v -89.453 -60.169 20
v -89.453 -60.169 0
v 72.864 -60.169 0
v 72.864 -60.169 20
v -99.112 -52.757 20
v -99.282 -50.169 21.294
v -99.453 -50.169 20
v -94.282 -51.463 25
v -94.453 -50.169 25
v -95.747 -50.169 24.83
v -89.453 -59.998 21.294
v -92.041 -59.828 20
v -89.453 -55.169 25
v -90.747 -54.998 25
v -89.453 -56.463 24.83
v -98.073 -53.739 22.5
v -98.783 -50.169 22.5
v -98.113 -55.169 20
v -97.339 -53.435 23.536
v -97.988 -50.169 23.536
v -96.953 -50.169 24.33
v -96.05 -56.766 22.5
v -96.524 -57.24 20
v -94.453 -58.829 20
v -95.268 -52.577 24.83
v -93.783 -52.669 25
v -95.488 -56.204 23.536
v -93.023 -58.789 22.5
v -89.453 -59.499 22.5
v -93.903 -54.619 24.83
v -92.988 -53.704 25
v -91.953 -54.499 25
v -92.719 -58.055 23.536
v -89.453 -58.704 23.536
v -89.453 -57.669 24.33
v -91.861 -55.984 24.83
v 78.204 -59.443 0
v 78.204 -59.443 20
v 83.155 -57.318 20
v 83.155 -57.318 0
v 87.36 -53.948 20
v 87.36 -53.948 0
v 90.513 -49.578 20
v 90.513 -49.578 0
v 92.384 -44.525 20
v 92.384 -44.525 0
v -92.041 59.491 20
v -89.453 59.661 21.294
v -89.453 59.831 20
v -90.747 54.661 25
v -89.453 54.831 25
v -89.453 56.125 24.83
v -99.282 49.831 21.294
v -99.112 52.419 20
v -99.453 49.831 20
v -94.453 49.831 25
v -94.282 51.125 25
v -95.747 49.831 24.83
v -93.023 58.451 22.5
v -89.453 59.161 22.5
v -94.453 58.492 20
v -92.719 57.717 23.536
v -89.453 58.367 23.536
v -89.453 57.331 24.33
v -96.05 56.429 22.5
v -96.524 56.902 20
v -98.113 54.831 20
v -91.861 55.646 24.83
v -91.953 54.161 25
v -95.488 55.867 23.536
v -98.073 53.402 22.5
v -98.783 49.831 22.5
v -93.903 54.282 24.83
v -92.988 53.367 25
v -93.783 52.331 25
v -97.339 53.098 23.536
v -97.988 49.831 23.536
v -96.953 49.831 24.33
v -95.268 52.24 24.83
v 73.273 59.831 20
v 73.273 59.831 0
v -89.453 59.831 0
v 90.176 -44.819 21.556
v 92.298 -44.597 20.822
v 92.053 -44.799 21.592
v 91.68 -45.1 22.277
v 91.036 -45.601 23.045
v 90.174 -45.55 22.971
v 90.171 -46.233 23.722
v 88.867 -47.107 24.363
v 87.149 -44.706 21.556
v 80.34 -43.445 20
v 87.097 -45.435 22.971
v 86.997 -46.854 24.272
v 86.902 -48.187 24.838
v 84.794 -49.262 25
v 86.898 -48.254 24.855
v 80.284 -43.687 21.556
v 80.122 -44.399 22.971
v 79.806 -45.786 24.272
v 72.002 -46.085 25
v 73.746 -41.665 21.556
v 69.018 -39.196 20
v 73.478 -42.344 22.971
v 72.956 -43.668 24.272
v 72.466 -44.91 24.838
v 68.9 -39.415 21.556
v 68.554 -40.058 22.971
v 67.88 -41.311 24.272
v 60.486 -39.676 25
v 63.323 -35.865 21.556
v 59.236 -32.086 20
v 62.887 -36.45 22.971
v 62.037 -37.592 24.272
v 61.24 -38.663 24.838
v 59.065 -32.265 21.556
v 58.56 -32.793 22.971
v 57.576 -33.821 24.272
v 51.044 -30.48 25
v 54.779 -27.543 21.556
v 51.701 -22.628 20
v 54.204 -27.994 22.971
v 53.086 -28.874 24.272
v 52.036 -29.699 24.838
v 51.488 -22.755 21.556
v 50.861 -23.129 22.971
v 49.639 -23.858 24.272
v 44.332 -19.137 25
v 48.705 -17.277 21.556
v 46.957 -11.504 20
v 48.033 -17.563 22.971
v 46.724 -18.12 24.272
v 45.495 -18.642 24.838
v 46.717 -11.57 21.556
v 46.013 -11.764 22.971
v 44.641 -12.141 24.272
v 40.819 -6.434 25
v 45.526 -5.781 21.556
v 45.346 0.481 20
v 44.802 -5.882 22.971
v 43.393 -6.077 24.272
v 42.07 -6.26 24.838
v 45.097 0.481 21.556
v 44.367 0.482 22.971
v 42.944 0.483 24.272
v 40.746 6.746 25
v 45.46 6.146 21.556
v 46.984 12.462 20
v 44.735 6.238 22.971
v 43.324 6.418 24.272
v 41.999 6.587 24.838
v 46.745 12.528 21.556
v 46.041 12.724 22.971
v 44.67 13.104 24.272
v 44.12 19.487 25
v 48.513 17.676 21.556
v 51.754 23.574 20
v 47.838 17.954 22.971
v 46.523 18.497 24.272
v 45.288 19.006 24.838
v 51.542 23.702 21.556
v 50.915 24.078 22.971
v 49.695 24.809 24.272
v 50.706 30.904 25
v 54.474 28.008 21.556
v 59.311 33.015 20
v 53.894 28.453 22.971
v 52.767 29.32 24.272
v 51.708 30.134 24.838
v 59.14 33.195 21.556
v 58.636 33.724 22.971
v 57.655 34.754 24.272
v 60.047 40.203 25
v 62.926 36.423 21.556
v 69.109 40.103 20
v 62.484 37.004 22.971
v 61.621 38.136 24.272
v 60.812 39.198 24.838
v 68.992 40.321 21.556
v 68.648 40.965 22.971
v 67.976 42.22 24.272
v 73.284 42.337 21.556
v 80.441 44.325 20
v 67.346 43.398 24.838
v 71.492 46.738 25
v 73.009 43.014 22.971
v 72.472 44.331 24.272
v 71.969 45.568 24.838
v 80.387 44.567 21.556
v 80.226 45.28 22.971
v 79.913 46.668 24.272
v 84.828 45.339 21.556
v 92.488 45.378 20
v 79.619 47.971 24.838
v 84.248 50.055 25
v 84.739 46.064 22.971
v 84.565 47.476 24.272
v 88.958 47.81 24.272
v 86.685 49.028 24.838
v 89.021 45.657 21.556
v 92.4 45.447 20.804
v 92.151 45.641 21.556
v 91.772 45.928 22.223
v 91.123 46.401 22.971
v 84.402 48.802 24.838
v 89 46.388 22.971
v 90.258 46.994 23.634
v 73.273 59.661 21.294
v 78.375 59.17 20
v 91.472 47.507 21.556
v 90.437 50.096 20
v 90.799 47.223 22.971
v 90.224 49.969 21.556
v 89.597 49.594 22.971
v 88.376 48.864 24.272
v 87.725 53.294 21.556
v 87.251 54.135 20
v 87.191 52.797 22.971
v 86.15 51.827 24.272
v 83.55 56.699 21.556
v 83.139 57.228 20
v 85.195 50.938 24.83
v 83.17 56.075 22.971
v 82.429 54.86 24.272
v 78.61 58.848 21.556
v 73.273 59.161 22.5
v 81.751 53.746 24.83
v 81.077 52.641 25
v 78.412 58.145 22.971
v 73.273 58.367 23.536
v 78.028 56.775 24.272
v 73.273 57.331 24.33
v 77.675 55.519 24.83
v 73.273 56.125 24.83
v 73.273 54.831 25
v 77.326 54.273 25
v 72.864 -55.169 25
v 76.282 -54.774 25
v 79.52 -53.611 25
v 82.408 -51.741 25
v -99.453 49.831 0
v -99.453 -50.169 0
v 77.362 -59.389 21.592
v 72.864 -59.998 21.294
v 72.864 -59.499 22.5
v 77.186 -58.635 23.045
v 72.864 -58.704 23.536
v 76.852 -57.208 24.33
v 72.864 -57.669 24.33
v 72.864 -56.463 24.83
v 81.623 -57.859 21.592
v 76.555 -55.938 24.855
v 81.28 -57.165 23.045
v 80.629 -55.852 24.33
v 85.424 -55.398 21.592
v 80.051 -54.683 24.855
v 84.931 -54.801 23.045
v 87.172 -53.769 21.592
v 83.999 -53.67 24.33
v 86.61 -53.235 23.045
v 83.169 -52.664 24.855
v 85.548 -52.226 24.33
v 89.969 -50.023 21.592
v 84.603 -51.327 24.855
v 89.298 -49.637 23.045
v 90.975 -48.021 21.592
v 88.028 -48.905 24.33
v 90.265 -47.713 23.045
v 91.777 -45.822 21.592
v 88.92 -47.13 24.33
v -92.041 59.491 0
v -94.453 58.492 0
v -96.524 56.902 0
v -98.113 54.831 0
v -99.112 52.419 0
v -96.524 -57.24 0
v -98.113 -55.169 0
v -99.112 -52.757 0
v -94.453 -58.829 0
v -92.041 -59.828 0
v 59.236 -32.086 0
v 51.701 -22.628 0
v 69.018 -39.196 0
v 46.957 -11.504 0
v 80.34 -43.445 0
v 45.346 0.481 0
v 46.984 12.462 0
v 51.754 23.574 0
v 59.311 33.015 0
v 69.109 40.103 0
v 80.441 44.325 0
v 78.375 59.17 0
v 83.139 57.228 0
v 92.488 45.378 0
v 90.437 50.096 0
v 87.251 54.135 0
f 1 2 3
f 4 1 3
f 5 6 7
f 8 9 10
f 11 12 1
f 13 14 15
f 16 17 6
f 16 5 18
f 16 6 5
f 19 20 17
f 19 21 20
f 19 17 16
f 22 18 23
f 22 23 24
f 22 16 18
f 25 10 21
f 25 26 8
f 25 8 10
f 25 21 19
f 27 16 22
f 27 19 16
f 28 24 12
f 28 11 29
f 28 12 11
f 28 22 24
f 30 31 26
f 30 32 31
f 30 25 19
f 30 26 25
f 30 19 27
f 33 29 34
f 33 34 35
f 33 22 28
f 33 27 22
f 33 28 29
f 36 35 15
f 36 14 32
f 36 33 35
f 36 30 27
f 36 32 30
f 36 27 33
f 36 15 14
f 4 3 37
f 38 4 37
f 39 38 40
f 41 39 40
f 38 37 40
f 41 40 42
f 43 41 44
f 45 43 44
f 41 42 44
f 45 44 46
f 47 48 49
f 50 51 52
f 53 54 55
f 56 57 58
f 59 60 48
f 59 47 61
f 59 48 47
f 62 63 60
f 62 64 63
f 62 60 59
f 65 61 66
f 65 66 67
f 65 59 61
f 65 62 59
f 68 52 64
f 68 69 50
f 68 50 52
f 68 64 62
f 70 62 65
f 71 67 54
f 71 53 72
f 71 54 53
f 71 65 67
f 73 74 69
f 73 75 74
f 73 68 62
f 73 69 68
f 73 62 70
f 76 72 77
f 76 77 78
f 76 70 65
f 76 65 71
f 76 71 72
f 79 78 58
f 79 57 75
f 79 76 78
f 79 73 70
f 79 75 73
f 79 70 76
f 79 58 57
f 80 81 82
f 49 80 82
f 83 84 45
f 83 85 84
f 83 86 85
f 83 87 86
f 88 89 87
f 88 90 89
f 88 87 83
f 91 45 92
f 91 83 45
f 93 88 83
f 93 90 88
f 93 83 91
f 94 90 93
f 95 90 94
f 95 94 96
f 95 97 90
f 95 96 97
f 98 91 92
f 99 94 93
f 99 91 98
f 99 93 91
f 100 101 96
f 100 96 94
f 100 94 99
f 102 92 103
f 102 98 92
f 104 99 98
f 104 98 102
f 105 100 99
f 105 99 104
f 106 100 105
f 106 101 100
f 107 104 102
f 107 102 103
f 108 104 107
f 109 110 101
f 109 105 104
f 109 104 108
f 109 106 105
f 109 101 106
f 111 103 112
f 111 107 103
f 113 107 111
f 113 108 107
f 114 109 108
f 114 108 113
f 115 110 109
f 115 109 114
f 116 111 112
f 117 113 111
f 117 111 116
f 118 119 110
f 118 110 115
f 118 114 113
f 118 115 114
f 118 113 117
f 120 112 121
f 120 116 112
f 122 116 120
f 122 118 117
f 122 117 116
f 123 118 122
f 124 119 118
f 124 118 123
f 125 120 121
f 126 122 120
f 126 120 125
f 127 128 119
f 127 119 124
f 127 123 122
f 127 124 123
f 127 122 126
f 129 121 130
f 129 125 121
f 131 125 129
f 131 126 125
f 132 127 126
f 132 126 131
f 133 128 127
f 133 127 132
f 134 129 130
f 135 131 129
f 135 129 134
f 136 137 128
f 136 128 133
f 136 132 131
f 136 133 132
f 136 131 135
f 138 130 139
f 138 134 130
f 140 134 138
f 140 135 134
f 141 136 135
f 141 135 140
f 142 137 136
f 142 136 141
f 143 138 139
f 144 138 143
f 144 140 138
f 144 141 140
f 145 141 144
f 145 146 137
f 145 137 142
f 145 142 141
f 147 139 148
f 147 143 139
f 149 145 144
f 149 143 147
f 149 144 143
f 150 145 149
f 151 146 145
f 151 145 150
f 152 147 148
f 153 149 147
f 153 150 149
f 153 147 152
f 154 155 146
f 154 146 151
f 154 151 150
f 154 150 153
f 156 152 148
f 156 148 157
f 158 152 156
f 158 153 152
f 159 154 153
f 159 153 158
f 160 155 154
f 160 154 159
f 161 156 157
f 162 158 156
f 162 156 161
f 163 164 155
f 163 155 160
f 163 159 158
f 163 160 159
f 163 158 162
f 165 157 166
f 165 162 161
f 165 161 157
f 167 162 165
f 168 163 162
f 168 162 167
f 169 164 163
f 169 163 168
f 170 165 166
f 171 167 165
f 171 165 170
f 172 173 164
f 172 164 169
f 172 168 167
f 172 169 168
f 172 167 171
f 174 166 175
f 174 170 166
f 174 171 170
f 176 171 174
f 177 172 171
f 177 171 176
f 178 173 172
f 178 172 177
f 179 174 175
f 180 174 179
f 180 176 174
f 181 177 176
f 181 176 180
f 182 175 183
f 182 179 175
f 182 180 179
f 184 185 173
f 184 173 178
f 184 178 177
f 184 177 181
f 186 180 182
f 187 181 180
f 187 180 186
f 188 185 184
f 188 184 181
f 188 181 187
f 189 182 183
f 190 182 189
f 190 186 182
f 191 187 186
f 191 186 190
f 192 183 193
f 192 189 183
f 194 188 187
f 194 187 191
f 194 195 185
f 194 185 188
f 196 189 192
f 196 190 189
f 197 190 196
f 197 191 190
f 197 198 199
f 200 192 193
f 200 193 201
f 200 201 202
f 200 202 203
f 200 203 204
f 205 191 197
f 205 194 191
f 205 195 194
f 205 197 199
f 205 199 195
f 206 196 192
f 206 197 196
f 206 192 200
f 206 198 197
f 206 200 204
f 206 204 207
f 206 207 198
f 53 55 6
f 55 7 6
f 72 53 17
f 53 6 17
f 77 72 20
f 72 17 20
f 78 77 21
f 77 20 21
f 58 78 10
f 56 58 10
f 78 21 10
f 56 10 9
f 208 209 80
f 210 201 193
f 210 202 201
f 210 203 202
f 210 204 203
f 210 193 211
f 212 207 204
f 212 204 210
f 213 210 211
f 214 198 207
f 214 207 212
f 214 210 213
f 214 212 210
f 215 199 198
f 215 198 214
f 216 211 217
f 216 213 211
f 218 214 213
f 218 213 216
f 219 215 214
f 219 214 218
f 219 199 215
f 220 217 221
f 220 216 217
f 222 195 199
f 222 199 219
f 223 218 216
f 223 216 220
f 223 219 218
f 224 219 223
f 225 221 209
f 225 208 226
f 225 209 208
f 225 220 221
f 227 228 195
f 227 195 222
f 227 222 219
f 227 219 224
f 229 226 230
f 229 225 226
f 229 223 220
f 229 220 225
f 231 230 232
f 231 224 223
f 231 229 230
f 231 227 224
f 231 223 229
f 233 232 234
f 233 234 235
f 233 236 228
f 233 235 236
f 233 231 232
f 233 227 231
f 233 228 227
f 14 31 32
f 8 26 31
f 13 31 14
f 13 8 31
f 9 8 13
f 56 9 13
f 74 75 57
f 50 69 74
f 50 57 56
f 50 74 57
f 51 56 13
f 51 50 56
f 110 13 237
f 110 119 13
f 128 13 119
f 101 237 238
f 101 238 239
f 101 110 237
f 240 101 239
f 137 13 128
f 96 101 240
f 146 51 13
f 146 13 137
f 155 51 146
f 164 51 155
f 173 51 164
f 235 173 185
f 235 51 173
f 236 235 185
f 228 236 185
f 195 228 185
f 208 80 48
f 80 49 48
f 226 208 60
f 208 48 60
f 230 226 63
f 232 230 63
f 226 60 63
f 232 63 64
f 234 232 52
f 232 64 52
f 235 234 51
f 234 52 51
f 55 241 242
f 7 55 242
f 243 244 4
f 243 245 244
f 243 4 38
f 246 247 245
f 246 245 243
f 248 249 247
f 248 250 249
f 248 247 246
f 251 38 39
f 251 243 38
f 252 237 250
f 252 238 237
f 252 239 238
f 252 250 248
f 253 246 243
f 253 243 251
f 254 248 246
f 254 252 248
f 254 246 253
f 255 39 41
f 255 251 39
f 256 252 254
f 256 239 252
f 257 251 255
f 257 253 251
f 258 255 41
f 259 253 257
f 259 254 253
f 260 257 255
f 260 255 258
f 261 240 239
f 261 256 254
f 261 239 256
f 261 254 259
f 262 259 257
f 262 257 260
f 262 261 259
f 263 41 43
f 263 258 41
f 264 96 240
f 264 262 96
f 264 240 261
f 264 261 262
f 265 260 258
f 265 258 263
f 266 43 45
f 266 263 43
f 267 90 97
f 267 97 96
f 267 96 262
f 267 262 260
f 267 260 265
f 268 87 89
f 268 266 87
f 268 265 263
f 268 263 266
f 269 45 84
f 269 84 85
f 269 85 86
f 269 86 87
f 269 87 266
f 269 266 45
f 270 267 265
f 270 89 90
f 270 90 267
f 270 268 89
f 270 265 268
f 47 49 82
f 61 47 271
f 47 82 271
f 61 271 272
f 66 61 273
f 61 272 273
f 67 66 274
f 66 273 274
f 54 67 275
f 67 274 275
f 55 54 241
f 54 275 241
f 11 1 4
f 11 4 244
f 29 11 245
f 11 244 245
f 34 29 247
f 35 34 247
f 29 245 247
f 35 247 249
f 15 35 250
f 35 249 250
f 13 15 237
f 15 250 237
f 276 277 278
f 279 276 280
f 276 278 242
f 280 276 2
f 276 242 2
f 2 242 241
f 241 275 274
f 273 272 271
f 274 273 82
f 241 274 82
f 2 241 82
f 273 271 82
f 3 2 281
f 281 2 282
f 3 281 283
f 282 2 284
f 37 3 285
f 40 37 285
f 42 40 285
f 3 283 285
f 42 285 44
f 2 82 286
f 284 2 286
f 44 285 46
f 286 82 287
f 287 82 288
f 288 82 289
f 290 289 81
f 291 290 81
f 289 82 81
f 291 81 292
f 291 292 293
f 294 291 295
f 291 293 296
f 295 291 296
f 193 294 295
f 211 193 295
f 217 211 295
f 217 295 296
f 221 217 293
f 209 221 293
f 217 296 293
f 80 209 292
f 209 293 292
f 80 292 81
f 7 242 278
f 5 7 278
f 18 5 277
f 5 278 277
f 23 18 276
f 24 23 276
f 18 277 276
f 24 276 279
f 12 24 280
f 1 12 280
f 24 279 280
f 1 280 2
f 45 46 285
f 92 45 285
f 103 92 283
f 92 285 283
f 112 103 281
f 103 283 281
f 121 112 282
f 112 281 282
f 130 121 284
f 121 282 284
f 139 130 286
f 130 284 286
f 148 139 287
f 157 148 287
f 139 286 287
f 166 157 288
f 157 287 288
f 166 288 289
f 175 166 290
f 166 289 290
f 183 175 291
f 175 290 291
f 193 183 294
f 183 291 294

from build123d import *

# Parameters (mm, degrees)
F1_DEPTH = 25
F2_R     = 5


with BuildPart() as f1:
    # F0 (on Top) → F1 (new body)
    with BuildSketch(Plane.XY):
        with BuildLine():
            Line((73.27253, 59.831257), (-89.452814, 59.831257))
            ThreePointArc((-89.452814, 59.831257), (-96.523882, 56.902325), (-99.452814, 49.831257))
            Line((-99.452814, 49.831257), (-99.452814, -50.168743))
            ThreePointArc((-99.452814, -50.168743), (-96.523882, -57.239811), (-89.452814, -60.168743))
            Line((-89.452814, -60.168743), (72.86438, -60.168743))
            ThreePointArc((72.86438, -60.168743), (85.371822, -55.775277), (92.384161, -44.525133))
            ThreePointArc((92.384161, -44.525133), (45.345589, 0.480687), (92.488089, 45.377633))
            ThreePointArc((92.488089, 45.377633), (85.294852, 55.814491), (73.27253, 59.831257))
        make_face()
    extrude(amount=F1_DEPTH)

    # F2
    f2_edges = [f1.edges().sort_by_distance(p)[0] for p in [
        (-8.090142, 59.831257, 25),
        (-99.452814, -0.168743, 25),
        (-8.294217, -60.168743, 25),
        (45.345589, 0.480687, 25),
    ]]
    fillet(f2_edges, radius=F2_R)


solid = f1.part
